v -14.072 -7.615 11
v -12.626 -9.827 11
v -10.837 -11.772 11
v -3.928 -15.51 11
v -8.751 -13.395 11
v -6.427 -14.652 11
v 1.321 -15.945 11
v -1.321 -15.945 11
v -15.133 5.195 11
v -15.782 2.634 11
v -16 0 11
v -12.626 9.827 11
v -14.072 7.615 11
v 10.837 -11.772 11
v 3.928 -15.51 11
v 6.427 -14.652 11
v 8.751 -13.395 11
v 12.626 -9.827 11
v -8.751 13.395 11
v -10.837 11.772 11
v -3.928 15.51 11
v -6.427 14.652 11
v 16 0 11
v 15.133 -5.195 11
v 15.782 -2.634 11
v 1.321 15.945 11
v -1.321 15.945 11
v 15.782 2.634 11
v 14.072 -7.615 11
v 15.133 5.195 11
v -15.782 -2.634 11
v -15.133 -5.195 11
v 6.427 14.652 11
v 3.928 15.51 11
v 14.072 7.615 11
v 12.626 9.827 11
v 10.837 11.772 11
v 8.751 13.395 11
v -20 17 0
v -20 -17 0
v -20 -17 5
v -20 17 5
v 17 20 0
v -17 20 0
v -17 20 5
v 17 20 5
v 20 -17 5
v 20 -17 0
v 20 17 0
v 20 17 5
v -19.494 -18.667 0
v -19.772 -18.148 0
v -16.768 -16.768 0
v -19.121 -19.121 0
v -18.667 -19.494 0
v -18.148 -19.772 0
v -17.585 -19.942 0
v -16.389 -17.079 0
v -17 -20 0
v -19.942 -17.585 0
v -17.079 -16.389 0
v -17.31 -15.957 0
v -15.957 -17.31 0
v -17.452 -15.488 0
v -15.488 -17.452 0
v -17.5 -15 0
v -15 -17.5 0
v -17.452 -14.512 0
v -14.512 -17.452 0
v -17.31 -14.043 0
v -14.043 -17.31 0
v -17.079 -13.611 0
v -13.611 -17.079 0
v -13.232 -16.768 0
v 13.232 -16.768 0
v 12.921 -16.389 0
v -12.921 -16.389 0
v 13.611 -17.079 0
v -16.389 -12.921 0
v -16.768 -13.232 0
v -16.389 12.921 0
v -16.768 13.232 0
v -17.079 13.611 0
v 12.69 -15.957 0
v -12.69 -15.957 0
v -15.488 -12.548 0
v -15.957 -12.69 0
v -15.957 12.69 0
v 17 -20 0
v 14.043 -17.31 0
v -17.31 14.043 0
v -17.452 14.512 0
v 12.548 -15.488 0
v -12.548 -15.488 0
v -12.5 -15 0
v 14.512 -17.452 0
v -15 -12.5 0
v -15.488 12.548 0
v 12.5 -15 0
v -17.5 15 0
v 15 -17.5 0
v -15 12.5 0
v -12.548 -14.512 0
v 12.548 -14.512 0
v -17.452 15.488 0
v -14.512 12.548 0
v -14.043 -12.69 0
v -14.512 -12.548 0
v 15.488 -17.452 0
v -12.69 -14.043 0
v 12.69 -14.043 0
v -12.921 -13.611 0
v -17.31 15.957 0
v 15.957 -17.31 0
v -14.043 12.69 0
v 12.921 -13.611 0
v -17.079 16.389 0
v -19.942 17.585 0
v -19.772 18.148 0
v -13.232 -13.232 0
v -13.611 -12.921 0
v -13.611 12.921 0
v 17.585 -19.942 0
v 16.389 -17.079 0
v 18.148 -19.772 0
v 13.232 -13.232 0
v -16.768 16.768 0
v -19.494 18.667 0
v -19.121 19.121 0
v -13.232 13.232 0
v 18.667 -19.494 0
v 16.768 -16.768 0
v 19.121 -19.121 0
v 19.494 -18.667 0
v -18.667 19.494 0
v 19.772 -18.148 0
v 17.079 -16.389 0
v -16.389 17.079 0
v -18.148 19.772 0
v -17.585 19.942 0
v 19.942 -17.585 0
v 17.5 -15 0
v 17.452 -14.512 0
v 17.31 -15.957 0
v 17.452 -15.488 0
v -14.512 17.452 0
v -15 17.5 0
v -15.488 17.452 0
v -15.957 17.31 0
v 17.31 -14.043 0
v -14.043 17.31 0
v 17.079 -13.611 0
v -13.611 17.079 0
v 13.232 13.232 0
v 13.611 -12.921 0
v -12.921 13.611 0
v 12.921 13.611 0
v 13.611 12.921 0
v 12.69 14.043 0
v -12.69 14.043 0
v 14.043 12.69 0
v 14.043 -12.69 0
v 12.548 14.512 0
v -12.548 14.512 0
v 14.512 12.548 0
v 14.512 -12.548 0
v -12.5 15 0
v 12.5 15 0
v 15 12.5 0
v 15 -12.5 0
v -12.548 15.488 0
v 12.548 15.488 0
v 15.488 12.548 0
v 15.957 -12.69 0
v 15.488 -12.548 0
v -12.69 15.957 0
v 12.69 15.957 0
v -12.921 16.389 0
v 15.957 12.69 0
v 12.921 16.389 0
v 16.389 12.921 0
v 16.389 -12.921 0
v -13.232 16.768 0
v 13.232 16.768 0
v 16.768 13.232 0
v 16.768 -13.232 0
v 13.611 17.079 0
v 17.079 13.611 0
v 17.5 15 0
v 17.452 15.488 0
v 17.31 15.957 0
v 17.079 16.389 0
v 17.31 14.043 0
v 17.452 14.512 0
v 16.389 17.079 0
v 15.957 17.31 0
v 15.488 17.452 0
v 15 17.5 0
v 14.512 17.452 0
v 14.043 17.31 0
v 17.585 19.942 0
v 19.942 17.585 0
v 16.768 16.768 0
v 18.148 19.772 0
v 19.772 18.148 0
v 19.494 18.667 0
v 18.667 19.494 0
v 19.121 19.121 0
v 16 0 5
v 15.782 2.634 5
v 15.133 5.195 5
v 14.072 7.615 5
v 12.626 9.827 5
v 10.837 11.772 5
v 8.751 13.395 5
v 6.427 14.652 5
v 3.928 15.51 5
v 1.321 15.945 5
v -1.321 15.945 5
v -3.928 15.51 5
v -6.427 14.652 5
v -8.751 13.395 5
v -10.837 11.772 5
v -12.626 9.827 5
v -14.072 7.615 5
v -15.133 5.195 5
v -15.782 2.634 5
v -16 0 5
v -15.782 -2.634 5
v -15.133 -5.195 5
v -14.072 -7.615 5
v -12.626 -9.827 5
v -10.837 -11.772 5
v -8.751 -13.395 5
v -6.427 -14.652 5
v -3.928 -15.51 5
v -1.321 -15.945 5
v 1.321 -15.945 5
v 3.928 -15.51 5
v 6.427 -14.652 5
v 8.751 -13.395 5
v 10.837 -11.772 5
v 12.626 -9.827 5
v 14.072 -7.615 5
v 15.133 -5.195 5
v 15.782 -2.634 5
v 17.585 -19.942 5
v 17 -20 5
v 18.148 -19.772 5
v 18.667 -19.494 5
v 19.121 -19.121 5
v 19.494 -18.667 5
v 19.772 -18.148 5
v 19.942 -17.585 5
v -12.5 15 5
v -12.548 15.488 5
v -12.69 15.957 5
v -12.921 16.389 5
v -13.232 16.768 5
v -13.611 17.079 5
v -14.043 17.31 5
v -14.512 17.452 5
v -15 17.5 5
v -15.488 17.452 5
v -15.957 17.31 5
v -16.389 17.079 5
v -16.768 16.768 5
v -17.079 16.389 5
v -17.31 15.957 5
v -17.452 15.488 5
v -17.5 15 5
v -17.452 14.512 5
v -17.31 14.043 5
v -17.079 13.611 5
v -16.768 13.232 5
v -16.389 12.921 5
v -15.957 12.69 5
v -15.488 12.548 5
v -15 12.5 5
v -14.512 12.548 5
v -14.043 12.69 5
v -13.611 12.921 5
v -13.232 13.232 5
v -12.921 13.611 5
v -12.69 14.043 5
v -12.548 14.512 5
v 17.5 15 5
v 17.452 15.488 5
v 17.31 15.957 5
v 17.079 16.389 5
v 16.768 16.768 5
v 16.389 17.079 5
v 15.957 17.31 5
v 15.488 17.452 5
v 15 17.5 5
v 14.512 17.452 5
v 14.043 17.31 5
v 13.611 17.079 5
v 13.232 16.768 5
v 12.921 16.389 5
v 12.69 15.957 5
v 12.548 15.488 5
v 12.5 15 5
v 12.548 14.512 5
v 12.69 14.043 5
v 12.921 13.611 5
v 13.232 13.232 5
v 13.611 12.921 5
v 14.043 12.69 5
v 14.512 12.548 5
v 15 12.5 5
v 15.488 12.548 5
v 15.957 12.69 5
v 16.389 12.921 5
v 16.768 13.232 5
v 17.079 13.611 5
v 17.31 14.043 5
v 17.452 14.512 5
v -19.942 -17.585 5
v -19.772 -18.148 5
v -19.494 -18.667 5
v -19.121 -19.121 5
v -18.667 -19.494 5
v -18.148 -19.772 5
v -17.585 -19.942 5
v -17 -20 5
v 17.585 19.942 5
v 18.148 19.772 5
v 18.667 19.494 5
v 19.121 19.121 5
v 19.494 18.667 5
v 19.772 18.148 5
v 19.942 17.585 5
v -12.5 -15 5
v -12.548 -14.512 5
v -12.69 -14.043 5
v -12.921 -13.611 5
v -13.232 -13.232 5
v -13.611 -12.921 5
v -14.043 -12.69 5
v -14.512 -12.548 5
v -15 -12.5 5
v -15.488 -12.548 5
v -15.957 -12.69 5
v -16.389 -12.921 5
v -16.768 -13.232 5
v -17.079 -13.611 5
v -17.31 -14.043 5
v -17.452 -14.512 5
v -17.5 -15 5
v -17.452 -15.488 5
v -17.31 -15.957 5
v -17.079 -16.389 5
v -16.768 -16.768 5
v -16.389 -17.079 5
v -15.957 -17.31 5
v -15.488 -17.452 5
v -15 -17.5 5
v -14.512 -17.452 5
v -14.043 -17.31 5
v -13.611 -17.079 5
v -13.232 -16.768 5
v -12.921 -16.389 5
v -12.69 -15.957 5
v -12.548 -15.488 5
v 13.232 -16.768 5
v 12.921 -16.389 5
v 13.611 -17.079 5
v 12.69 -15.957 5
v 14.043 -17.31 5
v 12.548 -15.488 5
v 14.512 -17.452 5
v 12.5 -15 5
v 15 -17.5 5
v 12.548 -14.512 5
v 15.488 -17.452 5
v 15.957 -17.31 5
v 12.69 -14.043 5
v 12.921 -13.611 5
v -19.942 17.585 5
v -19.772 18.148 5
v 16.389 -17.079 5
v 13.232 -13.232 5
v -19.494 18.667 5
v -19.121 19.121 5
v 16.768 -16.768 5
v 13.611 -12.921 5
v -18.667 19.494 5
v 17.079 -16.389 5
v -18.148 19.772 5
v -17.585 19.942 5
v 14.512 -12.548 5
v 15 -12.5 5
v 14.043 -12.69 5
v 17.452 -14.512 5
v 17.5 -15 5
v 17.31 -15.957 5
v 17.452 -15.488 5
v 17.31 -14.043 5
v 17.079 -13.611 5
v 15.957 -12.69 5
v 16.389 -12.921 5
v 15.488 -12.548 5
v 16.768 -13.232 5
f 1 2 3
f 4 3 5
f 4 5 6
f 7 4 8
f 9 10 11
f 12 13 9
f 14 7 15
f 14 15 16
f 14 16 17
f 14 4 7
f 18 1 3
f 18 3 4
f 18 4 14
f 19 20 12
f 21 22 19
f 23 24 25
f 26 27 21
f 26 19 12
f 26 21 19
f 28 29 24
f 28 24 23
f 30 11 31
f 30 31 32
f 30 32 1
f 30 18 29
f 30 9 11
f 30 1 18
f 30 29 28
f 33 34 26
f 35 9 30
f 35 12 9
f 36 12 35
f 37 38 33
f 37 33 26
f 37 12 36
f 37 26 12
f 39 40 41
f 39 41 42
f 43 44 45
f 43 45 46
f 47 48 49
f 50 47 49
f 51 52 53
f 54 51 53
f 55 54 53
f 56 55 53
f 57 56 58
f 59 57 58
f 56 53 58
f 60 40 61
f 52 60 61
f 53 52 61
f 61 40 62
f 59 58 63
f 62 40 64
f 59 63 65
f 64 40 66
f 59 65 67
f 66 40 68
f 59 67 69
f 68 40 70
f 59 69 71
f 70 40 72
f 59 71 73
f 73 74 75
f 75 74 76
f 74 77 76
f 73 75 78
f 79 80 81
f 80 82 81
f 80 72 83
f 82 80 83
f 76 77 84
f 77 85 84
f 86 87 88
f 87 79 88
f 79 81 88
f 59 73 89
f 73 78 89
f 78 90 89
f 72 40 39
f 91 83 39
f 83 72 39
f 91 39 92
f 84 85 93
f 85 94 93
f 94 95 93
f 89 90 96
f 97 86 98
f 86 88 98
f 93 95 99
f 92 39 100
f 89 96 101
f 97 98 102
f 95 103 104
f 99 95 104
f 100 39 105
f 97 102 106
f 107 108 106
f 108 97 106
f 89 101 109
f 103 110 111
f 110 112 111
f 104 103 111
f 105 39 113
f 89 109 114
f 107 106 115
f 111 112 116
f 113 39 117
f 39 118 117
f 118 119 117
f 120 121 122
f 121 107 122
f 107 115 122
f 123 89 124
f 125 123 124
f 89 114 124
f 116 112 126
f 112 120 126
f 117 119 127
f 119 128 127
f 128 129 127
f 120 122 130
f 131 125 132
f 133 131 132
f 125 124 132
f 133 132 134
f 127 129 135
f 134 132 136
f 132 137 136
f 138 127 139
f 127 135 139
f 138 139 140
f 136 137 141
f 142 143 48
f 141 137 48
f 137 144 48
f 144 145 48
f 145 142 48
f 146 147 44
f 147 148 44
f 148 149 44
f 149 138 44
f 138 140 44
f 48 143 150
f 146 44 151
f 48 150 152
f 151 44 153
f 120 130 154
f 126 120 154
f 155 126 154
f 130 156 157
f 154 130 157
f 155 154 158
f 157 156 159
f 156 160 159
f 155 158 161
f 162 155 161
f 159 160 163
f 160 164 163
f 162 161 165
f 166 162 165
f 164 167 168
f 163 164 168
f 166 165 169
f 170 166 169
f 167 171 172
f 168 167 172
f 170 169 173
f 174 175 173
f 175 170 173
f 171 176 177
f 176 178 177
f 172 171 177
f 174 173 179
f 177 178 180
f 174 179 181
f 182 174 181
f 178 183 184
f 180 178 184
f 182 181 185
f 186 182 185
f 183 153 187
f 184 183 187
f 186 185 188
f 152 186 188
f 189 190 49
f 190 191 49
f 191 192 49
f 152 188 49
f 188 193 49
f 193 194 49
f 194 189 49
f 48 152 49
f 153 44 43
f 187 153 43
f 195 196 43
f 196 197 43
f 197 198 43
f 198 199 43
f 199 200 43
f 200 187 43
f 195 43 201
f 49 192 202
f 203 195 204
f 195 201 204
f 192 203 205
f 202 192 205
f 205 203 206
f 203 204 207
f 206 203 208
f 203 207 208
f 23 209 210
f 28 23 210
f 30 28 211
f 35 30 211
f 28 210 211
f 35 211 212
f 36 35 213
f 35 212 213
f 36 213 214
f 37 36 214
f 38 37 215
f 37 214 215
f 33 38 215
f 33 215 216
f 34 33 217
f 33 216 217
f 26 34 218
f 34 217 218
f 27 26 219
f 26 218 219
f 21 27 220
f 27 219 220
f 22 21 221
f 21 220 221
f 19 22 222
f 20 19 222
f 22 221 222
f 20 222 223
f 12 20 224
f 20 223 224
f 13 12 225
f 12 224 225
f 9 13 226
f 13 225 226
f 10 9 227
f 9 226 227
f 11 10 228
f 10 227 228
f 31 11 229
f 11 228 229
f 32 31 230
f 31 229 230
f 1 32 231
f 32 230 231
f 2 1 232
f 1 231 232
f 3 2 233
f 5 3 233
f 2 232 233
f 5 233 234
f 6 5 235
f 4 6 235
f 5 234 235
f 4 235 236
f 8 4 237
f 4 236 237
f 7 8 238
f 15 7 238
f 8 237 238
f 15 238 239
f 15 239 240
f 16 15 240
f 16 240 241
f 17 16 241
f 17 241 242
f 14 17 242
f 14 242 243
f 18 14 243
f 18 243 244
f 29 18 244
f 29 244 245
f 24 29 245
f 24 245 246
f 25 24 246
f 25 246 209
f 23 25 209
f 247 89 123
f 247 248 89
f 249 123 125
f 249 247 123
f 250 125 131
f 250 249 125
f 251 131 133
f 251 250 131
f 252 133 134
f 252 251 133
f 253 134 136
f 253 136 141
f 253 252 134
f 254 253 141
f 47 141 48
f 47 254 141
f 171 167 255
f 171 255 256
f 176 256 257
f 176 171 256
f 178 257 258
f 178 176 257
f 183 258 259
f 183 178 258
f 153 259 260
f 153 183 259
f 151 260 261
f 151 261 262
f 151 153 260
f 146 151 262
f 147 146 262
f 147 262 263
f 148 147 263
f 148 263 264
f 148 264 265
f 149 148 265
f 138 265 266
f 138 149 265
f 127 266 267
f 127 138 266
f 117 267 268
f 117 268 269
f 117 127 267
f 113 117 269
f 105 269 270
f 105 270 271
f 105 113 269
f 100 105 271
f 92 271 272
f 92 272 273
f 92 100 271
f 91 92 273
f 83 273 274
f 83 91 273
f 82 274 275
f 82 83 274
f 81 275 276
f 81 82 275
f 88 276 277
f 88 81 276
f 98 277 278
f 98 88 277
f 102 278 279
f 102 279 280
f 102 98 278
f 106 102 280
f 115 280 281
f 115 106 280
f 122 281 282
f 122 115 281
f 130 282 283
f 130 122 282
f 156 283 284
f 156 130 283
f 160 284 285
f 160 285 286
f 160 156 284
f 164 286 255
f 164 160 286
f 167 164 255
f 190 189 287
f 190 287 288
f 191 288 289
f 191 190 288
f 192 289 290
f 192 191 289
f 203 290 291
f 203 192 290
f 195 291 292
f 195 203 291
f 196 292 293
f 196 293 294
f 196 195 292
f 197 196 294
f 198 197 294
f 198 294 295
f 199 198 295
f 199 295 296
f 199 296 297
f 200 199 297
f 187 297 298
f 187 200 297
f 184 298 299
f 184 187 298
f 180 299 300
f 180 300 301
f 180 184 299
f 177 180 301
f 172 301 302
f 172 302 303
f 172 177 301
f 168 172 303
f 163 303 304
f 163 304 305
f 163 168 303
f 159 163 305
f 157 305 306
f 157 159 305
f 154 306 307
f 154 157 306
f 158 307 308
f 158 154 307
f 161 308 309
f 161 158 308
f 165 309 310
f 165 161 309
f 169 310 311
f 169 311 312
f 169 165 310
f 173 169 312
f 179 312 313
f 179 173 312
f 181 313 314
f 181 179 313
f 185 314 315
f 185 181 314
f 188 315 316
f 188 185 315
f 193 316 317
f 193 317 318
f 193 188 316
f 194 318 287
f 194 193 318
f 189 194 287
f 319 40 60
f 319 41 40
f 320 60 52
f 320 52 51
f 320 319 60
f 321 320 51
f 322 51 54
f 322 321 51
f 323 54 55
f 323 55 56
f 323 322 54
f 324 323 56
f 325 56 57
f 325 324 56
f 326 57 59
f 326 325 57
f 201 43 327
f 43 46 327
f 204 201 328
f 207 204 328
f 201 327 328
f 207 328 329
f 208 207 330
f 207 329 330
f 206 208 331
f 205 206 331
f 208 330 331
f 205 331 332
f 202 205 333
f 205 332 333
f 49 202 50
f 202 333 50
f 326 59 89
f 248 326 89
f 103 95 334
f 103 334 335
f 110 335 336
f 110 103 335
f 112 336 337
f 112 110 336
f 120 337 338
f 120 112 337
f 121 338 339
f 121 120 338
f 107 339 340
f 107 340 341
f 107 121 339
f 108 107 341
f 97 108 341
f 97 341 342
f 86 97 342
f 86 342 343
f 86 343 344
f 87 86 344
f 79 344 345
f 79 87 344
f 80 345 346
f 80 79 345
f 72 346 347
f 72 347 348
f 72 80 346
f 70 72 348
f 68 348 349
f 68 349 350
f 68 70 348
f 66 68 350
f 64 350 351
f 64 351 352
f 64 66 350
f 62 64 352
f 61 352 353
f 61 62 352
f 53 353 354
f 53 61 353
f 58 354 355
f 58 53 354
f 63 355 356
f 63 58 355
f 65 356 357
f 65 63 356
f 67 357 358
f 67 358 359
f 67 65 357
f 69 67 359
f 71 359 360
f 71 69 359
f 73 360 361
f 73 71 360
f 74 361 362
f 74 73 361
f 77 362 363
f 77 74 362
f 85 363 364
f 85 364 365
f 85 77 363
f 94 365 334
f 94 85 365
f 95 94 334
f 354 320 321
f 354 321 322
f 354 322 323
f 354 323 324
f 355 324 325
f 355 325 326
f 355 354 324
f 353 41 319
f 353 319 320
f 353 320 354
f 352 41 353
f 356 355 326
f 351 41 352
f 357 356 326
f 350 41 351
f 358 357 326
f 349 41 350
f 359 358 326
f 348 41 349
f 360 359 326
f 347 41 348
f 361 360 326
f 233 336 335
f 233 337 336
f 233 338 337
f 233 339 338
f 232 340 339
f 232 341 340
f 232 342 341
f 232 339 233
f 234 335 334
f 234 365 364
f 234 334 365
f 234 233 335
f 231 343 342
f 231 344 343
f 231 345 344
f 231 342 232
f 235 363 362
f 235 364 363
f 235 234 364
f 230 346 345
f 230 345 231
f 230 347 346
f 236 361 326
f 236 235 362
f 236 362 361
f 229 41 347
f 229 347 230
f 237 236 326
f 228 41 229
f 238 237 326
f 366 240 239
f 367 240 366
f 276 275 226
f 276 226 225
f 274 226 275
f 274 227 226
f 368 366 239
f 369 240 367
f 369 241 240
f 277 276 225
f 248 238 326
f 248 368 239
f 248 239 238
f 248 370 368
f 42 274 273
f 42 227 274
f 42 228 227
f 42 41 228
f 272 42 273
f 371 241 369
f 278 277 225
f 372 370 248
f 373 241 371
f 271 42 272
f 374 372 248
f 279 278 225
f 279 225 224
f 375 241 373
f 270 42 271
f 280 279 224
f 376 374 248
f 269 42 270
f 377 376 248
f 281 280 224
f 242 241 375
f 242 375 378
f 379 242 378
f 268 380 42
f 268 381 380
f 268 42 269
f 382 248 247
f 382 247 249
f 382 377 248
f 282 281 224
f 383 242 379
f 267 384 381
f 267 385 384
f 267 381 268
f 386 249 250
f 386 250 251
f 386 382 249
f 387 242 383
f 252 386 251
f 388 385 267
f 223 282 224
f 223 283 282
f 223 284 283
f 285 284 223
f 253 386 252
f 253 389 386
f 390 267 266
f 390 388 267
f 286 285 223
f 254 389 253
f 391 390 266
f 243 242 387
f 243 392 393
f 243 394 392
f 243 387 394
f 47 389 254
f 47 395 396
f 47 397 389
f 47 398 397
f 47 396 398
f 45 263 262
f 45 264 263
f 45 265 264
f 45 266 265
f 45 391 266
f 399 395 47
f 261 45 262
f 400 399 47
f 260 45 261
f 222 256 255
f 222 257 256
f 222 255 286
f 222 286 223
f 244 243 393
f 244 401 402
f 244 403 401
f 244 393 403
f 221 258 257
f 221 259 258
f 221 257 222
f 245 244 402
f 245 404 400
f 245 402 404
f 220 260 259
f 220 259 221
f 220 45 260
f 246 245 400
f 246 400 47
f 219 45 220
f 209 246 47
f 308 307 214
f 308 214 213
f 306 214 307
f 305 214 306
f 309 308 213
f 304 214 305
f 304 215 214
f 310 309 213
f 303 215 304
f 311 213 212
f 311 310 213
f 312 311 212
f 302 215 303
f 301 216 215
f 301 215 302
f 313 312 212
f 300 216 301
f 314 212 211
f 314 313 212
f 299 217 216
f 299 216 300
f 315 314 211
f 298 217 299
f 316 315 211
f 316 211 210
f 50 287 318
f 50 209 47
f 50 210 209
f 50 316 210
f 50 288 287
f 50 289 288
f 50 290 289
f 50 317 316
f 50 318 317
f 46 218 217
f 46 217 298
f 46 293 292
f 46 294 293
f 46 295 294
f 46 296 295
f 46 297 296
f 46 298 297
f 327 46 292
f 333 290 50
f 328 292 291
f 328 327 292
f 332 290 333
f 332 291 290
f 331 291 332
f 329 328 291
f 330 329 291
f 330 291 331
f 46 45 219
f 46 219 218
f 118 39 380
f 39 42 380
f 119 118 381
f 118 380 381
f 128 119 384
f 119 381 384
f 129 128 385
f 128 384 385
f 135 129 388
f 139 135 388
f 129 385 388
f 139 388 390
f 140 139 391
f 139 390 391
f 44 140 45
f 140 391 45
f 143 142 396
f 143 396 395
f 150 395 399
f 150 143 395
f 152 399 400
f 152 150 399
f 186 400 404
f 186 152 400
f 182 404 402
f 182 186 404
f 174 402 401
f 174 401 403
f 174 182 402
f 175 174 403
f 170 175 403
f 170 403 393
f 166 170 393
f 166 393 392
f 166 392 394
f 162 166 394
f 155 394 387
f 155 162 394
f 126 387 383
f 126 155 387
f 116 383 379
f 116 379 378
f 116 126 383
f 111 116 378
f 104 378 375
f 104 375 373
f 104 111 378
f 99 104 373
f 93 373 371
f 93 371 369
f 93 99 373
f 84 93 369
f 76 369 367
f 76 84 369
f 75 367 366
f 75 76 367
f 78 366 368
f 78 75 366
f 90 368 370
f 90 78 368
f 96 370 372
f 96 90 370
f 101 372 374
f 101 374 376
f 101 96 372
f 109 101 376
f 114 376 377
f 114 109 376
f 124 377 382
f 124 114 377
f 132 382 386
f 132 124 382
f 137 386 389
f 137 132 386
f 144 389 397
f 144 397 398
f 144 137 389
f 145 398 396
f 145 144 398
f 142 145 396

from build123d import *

# Parameters (mm, degrees)
SKETCH1_W           = 40
SKETCH1_H           = 40
SKETCH1_R           = 2.5
BOSS_EXTRUDE1_DEPTH = 5
SKETCH2_R           = 16
BOSS_EXTRUDE2_DEPTH = 6
FILLET2_R           = 3


with BuildPart() as part:
    # Sketch1 → Boss-Extrude1 (new body)
    with BuildSketch(Plane.XY):
        Rectangle(SKETCH1_W, SKETCH1_H)
        with Locations((-15, 15)):
            Circle(SKETCH1_R, mode=Mode.SUBTRACT)
        with Locations((15, 15)):
            Circle(SKETCH1_R, mode=Mode.SUBTRACT)
        with Locations((15, -15)):
            Circle(SKETCH1_R, mode=Mode.SUBTRACT)
        with Locations((-15, -15)):
            Circle(SKETCH1_R, mode=Mode.SUBTRACT)
    extrude(amount=BOSS_EXTRUDE1_DEPTH)

    # Sketch2 → Boss-Extrude2 (add)
    with BuildSketch(Plane.XY.offset(5)):
        Circle(SKETCH2_R)
    extrude(amount=BOSS_EXTRUDE2_DEPTH)

    # Fillet2
    fillet2_edges = [part.edges().sort_by_distance(p)[0] for p in [
        (20, -20, 2.5),
        (-20, -20, 2.5),
        (-20, 20, 2.5),
        (20, 20, 2.5),
    ]]
    fillet(fillet2_edges, radius=FILLET2_R)


solid = part.part
